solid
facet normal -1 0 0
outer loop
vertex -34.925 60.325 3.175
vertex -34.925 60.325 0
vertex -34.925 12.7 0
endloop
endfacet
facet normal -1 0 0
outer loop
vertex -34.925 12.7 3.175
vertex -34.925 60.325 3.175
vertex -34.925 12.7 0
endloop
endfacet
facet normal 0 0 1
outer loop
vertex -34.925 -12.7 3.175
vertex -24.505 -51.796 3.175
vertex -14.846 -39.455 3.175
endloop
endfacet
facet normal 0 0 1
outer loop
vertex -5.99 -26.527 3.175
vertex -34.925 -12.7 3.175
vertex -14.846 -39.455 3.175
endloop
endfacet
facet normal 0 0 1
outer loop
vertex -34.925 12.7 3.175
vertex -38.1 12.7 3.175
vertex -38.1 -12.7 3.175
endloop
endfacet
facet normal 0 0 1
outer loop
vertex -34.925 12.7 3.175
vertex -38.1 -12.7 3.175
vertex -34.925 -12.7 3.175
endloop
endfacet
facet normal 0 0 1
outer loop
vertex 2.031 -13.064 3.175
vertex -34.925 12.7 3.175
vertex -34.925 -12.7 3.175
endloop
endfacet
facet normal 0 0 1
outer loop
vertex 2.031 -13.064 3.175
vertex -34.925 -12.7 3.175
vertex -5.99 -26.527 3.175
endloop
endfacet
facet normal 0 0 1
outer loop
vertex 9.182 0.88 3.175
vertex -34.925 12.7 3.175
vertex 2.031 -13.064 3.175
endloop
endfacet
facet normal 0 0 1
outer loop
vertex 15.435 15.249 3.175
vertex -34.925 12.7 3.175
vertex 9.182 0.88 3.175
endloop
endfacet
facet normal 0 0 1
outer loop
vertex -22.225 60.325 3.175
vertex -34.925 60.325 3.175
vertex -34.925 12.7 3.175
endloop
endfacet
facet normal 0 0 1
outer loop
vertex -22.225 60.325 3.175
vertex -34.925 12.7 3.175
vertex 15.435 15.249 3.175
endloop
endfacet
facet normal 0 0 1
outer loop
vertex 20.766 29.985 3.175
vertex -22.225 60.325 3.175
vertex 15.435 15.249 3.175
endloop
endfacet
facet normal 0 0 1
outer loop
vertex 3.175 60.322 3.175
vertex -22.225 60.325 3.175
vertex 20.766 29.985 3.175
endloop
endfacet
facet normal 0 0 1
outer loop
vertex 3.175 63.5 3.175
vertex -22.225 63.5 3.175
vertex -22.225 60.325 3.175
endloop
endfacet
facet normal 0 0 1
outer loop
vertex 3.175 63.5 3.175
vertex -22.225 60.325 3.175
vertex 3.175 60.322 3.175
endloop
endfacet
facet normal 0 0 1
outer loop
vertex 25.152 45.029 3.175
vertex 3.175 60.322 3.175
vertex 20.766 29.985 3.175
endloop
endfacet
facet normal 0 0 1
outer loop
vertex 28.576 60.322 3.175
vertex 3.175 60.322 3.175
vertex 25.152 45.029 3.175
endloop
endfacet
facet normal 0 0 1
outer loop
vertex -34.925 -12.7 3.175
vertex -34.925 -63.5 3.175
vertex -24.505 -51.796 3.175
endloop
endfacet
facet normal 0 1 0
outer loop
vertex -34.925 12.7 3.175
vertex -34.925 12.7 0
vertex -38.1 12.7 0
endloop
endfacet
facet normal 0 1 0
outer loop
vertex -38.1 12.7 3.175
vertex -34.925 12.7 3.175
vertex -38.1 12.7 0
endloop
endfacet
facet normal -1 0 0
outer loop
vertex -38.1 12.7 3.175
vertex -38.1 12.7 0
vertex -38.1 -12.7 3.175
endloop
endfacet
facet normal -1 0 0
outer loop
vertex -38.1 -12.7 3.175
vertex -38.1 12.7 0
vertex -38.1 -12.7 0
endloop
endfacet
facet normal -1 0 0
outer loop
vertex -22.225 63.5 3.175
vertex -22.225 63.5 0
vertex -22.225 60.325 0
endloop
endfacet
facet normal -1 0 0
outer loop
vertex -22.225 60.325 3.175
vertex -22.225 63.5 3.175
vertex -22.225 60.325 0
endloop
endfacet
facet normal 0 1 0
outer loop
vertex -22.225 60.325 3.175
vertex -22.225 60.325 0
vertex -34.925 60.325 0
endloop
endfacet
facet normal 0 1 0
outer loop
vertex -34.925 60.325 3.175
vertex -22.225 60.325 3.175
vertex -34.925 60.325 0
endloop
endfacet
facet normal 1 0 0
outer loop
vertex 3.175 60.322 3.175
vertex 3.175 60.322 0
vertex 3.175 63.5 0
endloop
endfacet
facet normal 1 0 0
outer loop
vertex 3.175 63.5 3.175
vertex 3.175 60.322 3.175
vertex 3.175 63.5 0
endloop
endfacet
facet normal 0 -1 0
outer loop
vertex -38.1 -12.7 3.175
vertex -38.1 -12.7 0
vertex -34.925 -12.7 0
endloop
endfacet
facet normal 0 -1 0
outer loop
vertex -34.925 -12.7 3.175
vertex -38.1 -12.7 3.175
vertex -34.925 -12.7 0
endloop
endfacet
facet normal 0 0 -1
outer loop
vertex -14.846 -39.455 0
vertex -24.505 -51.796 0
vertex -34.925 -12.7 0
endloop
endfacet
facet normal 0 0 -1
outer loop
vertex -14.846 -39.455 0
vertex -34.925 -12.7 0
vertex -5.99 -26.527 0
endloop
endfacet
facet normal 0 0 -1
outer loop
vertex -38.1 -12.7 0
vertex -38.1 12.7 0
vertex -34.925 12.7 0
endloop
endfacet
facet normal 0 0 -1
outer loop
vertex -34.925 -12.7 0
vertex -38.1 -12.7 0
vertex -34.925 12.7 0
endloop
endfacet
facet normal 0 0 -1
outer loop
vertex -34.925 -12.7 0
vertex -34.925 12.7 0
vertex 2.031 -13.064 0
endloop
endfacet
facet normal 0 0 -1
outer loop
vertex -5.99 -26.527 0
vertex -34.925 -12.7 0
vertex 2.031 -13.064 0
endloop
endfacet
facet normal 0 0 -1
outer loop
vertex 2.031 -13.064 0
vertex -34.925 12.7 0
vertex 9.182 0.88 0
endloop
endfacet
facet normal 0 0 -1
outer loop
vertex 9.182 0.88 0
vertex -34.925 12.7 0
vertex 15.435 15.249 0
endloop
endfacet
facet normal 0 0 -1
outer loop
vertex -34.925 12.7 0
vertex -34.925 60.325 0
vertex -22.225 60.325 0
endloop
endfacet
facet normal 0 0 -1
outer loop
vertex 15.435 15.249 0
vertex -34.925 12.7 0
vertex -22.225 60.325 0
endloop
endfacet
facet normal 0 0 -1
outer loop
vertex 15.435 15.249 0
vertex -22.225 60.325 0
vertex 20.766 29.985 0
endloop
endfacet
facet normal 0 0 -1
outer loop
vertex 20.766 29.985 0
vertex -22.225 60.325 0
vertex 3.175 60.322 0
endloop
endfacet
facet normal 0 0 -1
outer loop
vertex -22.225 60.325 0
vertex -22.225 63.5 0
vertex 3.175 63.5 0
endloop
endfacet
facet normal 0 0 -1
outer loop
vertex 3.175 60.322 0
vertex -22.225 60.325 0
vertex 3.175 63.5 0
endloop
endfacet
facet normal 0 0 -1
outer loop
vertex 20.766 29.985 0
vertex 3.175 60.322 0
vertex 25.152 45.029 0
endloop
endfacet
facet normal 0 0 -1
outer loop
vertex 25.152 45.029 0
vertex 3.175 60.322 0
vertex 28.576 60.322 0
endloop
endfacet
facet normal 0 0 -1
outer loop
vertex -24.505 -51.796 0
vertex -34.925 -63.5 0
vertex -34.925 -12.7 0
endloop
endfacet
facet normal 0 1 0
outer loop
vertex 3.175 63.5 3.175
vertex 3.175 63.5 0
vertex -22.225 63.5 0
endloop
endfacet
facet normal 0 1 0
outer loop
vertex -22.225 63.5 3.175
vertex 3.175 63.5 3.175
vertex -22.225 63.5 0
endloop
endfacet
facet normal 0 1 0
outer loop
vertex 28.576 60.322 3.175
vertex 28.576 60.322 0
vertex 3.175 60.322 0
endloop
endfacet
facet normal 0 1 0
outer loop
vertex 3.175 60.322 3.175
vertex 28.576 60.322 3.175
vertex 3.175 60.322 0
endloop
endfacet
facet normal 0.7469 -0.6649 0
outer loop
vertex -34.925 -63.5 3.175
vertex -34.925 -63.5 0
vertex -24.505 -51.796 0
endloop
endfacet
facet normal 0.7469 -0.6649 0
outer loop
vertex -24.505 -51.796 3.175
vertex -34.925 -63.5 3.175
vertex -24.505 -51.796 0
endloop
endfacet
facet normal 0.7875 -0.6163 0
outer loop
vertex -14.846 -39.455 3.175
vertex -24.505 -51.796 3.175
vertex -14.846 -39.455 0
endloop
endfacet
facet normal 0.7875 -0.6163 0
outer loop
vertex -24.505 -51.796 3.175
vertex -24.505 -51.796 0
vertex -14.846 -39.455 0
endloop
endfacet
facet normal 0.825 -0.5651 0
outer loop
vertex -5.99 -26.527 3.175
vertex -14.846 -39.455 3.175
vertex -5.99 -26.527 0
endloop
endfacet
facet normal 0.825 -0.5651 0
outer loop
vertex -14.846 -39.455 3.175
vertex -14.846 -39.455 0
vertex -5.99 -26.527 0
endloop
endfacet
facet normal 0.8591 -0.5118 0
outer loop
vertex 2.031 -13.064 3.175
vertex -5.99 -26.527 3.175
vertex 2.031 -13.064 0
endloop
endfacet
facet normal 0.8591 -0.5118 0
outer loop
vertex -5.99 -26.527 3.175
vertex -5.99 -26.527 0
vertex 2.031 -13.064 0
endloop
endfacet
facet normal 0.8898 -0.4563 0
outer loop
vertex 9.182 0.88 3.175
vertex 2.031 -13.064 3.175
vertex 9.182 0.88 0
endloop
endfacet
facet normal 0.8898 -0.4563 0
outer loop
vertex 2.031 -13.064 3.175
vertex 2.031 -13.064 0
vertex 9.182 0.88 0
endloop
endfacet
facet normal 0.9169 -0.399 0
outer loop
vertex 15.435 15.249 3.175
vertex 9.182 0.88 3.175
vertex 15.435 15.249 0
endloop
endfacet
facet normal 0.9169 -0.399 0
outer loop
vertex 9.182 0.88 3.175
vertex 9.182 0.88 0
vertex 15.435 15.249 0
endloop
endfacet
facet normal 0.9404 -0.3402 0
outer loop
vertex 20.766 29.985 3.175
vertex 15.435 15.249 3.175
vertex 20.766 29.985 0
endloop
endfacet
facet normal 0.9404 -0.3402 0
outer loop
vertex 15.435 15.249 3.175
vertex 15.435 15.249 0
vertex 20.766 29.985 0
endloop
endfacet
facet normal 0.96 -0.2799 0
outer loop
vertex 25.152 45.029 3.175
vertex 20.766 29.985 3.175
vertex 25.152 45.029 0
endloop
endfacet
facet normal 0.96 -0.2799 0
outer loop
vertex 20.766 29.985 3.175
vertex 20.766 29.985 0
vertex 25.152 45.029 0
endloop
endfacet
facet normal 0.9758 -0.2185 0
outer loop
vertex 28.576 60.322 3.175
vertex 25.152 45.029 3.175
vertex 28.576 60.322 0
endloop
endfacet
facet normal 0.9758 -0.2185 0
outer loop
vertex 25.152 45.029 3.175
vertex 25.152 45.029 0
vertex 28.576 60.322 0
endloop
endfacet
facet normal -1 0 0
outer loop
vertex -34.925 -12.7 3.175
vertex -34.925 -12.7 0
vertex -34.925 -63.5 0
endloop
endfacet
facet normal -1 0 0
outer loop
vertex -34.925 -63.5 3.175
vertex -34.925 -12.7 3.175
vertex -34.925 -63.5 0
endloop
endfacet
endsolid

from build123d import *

# Parameters (mm, degrees)
F1_DEPTH = 3.175


with BuildPart() as f1:
    # F0 (on Top) → F1 (new body)
    with BuildSketch(Plane.XY):
        with BuildLine():
            Line((3.175, 63.5), (-22.225, 63.5))
            Line((-22.225, 63.5), (-22.225, 60.325))
            Line((-22.225, 60.325), (-34.925, 60.325))
            Line((-34.925, 60.325), (-34.925, 12.7))
            Line((-34.925, 12.7), (-38.1, 12.7))
            Line((-38.1, 12.7), (-38.1, -12.7))
            Line((-38.1, -12.7), (-34.925, -12.7))
            Line((-34.925, -12.7), (-34.925, -60.325))
            Line((-34.925, -60.325), (-34.925, -63.5))
            ThreePointArc((-34.925, -63.5), (5.716612, -6.148907), (28.576396, 60.321527))
            Line((28.576396, 60.321527), (3.175, 60.321527))
            Line((3.175, 60.321527), (3.175, 63.5))
        make_face()
    extrude(amount=F1_DEPTH)


solid = f1.part
